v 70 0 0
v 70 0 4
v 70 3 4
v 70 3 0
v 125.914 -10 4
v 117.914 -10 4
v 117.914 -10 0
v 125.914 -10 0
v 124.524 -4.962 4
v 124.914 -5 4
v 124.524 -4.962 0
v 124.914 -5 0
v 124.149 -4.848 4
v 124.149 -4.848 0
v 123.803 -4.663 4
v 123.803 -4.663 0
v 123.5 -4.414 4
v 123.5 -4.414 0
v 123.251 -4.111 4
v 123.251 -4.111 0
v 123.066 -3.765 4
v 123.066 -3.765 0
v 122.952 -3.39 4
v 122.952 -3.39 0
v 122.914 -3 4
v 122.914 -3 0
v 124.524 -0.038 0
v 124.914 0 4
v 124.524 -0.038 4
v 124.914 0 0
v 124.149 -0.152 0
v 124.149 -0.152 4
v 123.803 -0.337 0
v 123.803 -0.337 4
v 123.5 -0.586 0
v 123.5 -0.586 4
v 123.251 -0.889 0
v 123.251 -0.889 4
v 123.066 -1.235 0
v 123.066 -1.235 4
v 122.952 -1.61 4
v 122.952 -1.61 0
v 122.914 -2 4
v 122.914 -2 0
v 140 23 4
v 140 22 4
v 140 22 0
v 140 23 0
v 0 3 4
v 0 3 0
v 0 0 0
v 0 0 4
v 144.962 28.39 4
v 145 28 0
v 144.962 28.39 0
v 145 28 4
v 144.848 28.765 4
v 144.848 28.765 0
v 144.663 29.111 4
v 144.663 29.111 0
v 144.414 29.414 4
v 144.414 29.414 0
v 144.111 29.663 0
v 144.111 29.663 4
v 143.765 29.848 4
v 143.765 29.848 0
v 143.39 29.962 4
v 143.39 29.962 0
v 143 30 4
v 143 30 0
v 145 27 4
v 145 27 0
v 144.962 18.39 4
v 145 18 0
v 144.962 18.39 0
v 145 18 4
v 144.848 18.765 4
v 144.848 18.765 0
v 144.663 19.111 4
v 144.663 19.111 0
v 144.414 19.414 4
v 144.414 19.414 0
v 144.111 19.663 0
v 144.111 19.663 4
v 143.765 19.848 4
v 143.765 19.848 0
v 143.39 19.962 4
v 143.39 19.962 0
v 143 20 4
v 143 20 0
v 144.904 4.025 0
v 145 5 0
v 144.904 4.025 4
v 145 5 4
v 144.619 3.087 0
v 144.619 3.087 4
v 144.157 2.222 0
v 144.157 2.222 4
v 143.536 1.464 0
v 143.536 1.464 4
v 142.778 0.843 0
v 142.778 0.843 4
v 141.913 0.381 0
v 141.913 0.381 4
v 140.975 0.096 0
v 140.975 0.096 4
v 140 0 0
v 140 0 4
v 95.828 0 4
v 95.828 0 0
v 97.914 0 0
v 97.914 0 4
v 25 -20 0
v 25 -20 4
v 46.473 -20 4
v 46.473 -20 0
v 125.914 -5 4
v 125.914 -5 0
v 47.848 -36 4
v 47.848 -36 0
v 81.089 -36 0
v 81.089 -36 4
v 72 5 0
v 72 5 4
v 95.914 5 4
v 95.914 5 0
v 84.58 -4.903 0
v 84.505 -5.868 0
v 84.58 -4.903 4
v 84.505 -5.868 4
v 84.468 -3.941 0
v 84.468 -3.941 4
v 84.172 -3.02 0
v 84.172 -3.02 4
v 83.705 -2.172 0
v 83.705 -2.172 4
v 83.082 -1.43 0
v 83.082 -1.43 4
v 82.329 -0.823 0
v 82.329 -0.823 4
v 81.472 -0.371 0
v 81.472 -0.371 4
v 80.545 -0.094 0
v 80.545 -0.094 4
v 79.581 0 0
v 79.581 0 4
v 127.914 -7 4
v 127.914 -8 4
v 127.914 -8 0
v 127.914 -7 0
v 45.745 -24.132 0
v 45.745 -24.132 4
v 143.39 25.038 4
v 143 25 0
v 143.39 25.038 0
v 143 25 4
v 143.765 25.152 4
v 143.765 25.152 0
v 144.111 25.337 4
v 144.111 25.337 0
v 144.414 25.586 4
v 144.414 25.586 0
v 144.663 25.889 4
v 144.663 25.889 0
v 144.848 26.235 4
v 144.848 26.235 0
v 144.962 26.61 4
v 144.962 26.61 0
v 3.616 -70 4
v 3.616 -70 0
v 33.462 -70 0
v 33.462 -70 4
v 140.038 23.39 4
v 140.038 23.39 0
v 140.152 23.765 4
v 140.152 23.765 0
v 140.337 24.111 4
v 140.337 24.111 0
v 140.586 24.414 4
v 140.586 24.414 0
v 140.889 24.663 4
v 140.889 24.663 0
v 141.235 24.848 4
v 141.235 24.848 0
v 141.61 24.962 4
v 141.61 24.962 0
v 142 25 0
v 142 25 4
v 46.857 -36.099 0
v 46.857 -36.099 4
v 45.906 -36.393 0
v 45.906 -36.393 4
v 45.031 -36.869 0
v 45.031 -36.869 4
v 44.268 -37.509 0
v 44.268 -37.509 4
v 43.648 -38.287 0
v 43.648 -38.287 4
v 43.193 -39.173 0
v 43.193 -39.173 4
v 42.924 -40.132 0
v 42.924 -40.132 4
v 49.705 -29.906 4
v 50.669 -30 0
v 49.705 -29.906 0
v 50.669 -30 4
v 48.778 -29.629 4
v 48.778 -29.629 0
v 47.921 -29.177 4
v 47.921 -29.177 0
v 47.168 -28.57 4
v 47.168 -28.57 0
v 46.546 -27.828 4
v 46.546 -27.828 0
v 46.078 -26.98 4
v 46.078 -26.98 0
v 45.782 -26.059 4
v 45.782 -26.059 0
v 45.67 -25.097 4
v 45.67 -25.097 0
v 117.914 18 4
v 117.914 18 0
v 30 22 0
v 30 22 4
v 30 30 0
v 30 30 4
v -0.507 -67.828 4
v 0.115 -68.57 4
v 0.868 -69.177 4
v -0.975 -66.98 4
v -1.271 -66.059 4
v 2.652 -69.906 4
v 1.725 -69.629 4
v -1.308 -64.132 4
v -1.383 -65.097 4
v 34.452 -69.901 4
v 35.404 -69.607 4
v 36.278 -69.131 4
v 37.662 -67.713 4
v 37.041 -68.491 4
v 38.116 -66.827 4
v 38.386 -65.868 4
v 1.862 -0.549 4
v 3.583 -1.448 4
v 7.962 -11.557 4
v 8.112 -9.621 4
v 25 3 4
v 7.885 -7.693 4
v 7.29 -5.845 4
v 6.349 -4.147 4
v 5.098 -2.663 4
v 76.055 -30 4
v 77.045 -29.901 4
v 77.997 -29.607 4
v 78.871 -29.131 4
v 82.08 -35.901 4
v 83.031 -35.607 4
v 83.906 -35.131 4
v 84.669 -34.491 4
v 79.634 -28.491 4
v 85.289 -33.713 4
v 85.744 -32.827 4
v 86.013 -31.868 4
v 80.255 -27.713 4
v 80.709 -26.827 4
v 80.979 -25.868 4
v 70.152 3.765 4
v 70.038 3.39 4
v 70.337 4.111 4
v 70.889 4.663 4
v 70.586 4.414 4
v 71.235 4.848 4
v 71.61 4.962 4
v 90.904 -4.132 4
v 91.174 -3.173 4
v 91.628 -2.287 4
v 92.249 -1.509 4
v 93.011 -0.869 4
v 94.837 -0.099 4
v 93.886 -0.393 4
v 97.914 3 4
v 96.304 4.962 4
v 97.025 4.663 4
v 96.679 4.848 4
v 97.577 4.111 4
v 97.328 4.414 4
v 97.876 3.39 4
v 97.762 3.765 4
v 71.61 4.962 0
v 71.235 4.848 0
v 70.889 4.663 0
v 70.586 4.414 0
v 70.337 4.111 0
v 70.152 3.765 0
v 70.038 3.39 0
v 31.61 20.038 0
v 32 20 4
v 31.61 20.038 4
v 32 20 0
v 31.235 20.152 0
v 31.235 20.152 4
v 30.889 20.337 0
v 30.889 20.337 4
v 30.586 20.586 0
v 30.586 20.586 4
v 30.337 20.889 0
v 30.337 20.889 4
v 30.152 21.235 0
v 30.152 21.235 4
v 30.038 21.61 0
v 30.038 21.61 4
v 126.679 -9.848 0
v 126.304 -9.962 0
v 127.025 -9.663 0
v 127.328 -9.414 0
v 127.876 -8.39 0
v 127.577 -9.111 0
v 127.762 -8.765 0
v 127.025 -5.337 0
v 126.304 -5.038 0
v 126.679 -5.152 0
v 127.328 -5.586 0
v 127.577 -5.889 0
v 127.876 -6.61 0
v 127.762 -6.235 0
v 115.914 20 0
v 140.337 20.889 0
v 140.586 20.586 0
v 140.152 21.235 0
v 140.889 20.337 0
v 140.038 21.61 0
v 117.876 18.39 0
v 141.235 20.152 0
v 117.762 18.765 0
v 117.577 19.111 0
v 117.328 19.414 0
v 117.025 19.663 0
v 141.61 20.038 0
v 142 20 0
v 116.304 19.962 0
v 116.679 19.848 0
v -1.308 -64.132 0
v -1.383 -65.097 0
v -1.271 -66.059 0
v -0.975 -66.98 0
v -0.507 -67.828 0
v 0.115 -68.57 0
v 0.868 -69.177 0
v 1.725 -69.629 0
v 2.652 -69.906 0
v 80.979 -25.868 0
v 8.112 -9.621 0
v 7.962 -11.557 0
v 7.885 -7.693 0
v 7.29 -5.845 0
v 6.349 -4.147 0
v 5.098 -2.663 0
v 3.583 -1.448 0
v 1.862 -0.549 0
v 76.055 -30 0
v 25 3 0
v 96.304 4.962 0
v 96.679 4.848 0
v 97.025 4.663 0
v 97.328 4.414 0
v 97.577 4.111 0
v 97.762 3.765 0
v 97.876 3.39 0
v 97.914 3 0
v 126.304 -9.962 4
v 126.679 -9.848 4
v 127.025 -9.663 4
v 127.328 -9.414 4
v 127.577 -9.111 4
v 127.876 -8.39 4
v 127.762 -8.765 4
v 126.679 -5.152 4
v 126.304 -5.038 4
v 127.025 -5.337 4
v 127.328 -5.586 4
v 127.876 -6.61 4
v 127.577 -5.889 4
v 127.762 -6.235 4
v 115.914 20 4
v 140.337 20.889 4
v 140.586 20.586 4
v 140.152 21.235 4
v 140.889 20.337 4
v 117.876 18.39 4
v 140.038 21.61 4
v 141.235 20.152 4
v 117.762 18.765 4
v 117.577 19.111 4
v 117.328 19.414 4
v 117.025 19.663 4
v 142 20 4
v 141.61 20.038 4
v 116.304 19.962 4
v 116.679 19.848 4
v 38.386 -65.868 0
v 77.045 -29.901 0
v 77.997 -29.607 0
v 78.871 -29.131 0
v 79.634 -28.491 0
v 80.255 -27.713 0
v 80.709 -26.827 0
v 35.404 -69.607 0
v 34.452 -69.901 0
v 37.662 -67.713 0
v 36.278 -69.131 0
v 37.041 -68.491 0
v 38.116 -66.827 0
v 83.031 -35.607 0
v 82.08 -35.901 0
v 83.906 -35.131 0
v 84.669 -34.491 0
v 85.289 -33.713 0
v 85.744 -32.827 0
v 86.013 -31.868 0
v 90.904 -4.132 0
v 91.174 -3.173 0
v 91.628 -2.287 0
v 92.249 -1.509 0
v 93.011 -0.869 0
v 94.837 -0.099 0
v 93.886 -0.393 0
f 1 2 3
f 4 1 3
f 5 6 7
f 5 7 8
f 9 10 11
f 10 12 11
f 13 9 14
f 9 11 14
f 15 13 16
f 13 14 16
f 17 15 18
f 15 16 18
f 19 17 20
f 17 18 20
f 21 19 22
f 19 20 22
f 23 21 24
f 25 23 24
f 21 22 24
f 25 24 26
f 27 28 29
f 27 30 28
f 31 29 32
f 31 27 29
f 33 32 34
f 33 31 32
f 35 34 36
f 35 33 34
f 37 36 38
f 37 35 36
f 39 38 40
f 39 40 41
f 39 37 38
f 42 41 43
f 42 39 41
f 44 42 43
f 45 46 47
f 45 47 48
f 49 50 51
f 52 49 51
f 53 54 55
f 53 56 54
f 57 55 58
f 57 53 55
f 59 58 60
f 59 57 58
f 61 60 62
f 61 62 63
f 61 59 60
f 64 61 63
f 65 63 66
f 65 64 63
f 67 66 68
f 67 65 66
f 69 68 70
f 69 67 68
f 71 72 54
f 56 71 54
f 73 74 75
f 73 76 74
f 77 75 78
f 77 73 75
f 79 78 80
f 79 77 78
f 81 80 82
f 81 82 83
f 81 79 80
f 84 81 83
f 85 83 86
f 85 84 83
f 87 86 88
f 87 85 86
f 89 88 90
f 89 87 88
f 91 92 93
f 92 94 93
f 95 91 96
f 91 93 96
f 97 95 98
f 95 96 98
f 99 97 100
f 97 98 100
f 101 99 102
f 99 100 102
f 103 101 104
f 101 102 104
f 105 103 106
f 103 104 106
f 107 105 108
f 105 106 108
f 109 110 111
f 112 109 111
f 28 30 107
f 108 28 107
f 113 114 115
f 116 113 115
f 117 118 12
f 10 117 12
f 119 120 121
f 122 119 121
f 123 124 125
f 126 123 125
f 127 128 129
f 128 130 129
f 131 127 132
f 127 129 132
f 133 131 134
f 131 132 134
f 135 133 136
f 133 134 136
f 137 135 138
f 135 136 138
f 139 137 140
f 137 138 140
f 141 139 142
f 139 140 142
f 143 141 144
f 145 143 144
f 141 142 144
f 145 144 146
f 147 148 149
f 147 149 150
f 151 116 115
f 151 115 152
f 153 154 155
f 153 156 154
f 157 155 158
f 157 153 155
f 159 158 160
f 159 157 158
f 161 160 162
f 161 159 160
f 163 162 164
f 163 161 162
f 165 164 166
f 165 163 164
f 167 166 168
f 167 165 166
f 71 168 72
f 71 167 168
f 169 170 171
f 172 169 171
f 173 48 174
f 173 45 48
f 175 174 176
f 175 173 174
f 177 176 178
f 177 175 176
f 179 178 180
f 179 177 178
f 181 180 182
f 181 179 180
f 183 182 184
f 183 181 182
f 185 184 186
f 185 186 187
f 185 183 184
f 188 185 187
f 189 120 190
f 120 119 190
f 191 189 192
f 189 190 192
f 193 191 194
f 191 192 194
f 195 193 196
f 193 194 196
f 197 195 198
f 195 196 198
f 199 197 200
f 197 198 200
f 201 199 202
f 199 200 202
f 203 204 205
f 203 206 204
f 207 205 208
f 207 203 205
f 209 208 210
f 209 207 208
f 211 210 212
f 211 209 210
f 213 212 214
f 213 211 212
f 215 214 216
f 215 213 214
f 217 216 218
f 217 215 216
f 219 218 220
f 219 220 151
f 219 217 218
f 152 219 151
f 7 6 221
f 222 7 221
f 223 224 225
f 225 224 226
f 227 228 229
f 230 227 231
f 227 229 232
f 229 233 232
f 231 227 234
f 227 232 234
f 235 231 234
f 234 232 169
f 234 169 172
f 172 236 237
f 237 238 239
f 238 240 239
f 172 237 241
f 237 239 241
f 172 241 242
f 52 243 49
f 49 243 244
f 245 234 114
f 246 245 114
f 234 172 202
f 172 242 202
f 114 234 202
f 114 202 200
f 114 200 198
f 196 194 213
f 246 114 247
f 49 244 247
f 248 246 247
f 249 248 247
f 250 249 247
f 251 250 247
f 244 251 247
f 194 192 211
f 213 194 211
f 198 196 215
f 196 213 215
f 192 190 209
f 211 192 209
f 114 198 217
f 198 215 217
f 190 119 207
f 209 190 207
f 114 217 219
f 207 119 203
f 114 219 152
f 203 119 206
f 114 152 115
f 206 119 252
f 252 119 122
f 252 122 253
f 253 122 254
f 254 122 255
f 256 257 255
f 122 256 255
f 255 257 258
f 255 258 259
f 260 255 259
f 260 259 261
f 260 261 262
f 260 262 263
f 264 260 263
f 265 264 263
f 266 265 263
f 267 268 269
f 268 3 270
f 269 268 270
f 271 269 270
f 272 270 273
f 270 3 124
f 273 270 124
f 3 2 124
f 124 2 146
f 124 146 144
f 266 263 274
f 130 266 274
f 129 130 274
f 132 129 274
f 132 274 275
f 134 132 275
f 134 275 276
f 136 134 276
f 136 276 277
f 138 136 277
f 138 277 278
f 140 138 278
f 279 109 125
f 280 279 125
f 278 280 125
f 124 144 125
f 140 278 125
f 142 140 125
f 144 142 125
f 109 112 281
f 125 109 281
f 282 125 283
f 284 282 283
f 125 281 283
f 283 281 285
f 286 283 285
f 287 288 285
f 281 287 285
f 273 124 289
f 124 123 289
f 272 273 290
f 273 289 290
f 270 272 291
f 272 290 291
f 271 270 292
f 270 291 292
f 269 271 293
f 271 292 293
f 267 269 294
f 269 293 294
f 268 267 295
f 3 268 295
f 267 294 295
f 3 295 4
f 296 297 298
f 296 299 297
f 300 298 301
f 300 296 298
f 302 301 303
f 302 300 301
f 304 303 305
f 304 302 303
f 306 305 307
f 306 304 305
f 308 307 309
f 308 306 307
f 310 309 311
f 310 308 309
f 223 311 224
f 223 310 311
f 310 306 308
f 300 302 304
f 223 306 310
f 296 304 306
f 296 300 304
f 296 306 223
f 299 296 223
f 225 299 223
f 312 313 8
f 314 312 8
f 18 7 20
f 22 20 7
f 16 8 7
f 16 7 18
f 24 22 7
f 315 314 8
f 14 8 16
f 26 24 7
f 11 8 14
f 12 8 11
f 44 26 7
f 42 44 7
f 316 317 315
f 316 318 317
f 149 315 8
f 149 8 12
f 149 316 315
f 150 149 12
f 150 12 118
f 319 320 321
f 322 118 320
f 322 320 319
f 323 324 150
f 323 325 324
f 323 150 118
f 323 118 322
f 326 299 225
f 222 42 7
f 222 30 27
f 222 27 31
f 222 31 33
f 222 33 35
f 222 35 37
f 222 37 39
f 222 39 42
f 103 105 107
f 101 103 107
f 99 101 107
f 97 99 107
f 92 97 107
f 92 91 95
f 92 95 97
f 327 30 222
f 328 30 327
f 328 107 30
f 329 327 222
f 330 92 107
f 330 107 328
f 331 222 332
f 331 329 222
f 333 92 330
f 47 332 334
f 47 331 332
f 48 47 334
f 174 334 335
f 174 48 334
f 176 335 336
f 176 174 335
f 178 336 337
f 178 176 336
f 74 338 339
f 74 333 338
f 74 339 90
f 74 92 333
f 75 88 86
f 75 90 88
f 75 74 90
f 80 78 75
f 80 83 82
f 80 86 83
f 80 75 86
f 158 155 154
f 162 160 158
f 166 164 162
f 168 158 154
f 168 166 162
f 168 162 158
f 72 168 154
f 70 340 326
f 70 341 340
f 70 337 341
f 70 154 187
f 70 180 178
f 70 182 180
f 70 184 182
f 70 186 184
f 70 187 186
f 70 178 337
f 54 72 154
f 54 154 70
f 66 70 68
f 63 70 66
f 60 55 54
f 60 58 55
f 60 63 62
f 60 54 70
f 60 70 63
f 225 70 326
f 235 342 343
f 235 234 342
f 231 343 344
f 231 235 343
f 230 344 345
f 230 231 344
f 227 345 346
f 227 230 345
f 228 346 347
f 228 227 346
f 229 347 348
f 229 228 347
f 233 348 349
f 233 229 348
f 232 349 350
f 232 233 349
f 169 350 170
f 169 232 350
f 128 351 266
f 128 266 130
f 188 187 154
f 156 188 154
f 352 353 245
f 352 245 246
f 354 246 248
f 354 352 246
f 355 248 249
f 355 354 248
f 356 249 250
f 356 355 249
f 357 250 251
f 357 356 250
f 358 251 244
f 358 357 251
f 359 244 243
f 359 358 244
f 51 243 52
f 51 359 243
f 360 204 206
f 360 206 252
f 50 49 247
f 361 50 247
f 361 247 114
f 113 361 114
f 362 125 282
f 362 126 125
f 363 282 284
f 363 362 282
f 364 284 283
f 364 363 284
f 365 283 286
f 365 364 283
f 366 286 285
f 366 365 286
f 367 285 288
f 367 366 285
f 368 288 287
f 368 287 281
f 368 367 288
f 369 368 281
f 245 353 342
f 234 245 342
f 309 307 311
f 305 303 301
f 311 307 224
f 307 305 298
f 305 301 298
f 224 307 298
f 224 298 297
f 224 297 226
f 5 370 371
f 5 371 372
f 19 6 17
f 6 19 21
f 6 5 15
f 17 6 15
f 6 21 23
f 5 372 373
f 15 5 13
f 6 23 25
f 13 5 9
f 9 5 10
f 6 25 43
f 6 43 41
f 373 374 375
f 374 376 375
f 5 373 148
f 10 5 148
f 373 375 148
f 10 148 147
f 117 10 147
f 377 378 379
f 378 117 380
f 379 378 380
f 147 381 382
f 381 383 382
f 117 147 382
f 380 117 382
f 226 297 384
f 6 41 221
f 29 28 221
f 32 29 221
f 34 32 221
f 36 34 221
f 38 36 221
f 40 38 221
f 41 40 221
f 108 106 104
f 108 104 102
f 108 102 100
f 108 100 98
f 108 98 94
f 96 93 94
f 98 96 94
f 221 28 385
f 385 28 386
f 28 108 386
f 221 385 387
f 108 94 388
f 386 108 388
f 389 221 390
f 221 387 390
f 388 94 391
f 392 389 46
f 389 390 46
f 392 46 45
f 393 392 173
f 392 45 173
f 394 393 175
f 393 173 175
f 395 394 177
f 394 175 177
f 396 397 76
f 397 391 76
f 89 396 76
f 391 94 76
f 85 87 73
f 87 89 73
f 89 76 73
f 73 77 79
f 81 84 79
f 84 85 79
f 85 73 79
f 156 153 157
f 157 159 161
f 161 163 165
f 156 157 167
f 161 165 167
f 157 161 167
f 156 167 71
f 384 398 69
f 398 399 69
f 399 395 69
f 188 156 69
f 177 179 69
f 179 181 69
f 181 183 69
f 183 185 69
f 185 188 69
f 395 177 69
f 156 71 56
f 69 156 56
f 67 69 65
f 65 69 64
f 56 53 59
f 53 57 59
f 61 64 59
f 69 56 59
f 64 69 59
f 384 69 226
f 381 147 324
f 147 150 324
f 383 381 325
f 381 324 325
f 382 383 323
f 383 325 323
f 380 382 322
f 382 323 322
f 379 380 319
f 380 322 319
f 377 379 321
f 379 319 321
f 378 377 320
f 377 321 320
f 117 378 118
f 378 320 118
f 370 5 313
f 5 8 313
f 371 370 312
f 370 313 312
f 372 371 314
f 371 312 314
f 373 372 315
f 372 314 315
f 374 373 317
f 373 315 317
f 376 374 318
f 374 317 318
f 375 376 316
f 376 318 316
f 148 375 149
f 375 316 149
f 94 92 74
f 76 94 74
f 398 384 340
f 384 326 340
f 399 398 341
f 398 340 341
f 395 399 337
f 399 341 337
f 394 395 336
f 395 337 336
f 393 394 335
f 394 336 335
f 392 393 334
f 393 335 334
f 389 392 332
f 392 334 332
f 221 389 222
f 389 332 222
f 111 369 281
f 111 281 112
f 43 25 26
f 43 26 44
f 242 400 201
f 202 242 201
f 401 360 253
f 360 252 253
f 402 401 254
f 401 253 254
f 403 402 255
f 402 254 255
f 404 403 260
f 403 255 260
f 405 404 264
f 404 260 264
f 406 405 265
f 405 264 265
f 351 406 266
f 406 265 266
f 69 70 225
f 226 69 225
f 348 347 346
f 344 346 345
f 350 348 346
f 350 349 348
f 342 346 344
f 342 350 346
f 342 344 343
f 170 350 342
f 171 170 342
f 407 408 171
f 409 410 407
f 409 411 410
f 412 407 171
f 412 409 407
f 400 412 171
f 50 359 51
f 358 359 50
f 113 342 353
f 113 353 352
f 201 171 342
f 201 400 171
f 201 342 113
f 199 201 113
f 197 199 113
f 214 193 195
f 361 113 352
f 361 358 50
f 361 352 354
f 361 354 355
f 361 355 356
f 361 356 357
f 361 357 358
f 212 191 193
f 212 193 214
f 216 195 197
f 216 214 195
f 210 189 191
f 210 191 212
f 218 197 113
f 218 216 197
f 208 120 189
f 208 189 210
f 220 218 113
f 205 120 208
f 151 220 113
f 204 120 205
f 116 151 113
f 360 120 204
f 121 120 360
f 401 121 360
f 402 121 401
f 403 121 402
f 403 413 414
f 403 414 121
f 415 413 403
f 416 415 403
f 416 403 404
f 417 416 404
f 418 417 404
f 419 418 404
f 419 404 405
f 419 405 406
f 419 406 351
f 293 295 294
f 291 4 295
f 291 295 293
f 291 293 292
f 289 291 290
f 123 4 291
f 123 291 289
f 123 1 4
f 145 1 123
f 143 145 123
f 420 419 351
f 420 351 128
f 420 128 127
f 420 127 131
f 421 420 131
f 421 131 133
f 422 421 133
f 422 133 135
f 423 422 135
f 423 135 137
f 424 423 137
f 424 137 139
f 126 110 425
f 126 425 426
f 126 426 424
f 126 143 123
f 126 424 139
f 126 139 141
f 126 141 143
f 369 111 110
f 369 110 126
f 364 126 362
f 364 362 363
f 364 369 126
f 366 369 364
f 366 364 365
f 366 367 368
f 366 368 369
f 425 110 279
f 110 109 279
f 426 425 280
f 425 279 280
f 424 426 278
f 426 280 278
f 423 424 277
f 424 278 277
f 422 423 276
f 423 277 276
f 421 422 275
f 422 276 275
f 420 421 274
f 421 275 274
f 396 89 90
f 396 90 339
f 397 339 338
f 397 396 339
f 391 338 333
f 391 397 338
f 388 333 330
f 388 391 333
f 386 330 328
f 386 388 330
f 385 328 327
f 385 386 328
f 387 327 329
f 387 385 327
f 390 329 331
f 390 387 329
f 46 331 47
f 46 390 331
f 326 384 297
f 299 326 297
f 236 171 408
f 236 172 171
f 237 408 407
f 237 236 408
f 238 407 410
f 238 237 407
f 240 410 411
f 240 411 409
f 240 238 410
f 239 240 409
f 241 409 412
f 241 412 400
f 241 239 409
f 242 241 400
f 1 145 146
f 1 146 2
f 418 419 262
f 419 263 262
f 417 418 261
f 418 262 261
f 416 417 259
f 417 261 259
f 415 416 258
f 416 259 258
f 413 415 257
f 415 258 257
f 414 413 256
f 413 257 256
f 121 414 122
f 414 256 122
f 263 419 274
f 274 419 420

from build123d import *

# Parameters (mm, degrees)
BOSS_EXTRUDE1_DEPTH = 4
FILLET1_R           = 10
FILLET2_R           = 5
CUT_EXTRUDE1_DEPTH  = 4
LPATTERN1_COUNT     = 6
LPATTERN1_PITCH     = 4
FILLET3_R           = 2
FILLET4_R           = 2
BOSS_EXTRUDE2_DEPTH = 4
FILLET5_R           = 2
CUT_EXTRUDE2_DEPTH  = 4
FILLET6_R           = 2
FILLET7_R           = 2
FILLET8_R           = 2
FILLET9_R           = 2


with BuildPart() as part:
    # Sketch1 → Boss-Extrude1 (new body)
    with BuildSketch(Plane.XY):
        Polygon((10, 0), (-2.34288865, -70), (37.65711135, -70), (43.652228694, -36), (85.284719782, -36), (91.632491087, 0), (145, 0), (145, 20), (140, 20), (140, 25), (145, 25), (145, 30), (0, 30), (0, 0), align=None)
        Polygon((44.710190579, -30), (80.250121995, -30), (85.539931416, 0), (50, 0), align=None, mode=Mode.SUBTRACT)
    extrude(amount=BOSS_EXTRUDE1_DEPTH)

    # Fillet1
    # the kernel refuses this fillet: 10 mm, written as the material it adds along each edge
    with BuildSketch(Plane(origin=(10, 0, 0), x_dir=(-0.17364817766693433, -0.9848077530122074, 0), z_dir=(0, 0, 1))) as fillet1_piece_1:
        with BuildLine():
            CenterArc((11.735327688, -10), FILLET1_R, 90, 89.129514879)
            Line((1.736481777, -9.84807753), (1.536504858, -9.845039081))
            ThreePointArc((1.536504858, -9.845039081), (0.671279338, -4.958768401), (-0.196961551, -0.034729636))
            Line((-0.196961551, -0.034729636), (0, 0.2))
            Line((0, 0.2), (11.735327688, 0.2))
            Line((11.735327688, 0.2), (11.735327688, 0))
        make_face()
    extrude(amount=4)

    # Fillet2
    fillet2_edges = [part.edges().sort_by_distance(p)[0] for p in [
        (145, 0, 2),
        (91.632491087, 0, 2),
        (85.284719782, -36, 2),
        (43.652228694, -36, 2),
        (37.65711135, -70, 2),
        (-2.34288865, -70, 2),
        (85.539931416, 0, 2),
        (50, 0, 2),
        (44.710190579, -30, 2),
        (80.250121995, -30, 2),
    ]]
    fillet(fillet2_edges, radius=FILLET2_R)

    # Sketch2 → Cut-Extrude1 (cut)
    with BuildSketch(Plane.XY.offset(4)):
        Polygon((0, 27), (4, 27), (0, 23), align=None)
    cut_extrude1 = extrude(amount=-CUT_EXTRUDE1_DEPTH, mode=Mode.SUBTRACT)

    # LPattern1: Cut-Extrude1 ×6
    with Locations(*[(0, -i * LPATTERN1_PITCH, 0) for i in range(1, LPATTERN1_COUNT)]):
        add(cut_extrude1, mode=Mode.SUBTRACT)

    # Fillet3
    fillet3_edges = [part.edges().sort_by_distance(p)[0] for p in [
        (145, 25, 2),
        (140, 25, 2),
        (140, 20, 2),
        (145, 20, 2),
    ]]
    fillet(fillet3_edges, radius=FILLET3_R)

    # Fillet4
    fillet4_edges = [part.edges().sort_by_distance(p)[0] for p in [
        (145, 30, 2),
    ]]
    fillet(fillet4_edges, radius=FILLET4_R)

    # Sketch3 → Boss-Extrude2 (add)
    with BuildSketch(Plane.XY.offset(4)):
        Polygon((117.913994622, 0), (117.913994622, -10), (127.913994622, -10), (127.913994622, -5), (122.913994622, -5), (122.913994622, 0), align=None)
    extrude(amount=-BOSS_EXTRUDE2_DEPTH)

    # Fillet5
    fillet5_edges = [part.edges().sort_by_distance(p)[0] for p in [
        (122.913994622, 0, 2),
        (122.913994622, -5, 2),
        (127.913994622, -5, 2),
        (127.913994622, -10, 2),
    ]]
    fillet(fillet5_edges, radius=FILLET5_R)

    # Sketch4 → Cut-Extrude2 (cut)
    with BuildSketch(Plane.XY.offset(4)):
        Polygon((117.913994622, 0), (117.913994622, 20), (30, 20), (30, 30), (0, 30), (0, 3), (25, 3), (25, -20), (70, -20), (70, 5), (97.913994622, 5), (97.913994622, 0), align=None)
    extrude(amount=-CUT_EXTRUDE2_DEPTH, mode=Mode.SUBTRACT)


with BuildPart() as cut_extrude2_piece_1:
    # of the separate pieces the step leaves, piece 1, a body of its own (cut_extrude2_pieces)
    add(part.part.solids().sort_by_distance((97.913994622, 5, 0))[0])

    # Fillet7
    fillet7_edges = [cut_extrude2_piece_1.edges().sort_by_distance(p)[0] for p in [
        (97.913994622, 5, 2),
    ]]
    fillet(fillet7_edges, radius=FILLET7_R)

    # Fillet9
    fillet9_edges = [cut_extrude2_piece_1.edges().sort_by_distance(p)[0] for p in [
        (70, 5, 2),
    ]]
    fillet(fillet9_edges, radius=FILLET9_R)


with BuildPart() as cut_extrude2_piece_2:
    # of the separate pieces the step leaves, piece 2, a body of its own (cut_extrude2_pieces)
    add(part.part.solids().sort_by_distance((124.913994622, 0, 0))[0])

    # Fillet6
    fillet6_edges = [cut_extrude2_piece_2.edges().sort_by_distance(p)[0] for p in [
        (117.913994622, 20, 2),
    ]]
    fillet(fillet6_edges, radius=FILLET6_R)

    # Fillet8
    fillet8_edges = [cut_extrude2_piece_2.edges().sort_by_distance(p)[0] for p in [
        (30, 20, 2),
    ]]
    fillet(fillet8_edges, radius=FILLET8_R)


solid = Compound([cut_extrude2_piece_1.part, cut_extrude2_piece_2.part])
